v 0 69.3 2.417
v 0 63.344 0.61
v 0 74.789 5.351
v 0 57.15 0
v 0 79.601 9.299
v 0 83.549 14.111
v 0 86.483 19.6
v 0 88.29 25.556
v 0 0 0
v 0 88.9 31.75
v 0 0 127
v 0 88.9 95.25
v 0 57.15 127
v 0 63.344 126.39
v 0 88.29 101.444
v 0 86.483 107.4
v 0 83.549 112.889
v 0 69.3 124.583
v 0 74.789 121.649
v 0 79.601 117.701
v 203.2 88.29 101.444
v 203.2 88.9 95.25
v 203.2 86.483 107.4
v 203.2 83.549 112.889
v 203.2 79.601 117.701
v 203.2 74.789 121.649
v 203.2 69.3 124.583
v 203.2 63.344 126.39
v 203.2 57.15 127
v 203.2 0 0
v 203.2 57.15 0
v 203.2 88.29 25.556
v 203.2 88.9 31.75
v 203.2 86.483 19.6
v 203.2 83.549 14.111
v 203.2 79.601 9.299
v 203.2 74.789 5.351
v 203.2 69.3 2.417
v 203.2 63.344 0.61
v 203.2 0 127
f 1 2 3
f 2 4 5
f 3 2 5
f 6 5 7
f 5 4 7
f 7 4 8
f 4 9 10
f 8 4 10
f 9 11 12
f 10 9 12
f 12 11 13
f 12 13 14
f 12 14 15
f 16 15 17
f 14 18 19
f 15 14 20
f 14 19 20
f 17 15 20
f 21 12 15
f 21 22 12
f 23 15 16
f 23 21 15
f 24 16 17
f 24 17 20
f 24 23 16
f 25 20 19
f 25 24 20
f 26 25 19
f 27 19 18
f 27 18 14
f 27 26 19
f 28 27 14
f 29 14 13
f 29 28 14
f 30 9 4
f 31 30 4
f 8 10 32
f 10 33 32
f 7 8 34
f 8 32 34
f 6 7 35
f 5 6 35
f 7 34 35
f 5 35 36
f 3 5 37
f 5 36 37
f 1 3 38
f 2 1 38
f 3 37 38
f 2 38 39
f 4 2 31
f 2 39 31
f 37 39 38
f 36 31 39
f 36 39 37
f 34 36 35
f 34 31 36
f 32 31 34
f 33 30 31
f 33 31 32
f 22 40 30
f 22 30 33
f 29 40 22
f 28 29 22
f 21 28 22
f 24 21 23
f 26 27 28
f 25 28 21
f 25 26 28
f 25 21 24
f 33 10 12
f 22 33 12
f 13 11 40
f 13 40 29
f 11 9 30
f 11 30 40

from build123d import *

# Parameters (mm, degrees)
F0_W     = 88.9
F0_H     = 127
F1_DEPTH = 203.2
F2_R     = 31.75
F3_R     = 31.75


with BuildPart() as f1:
    # F0 (on Right) → F1 (new body)
    with BuildSketch(Plane.YZ):
        with Locations((44.45, 63.5)):
            Rectangle(F0_W, F0_H)
    extrude(amount=F1_DEPTH)

    # F2
    f2_edges = [f1.edges().sort_by_distance(p)[0] for p in [
        (101.6, 88.9, 127),
    ]]
    fillet(f2_edges, radius=F2_R)

    # F3
    f3_edges = [f1.edges().sort_by_distance(p)[0] for p in [
        (101.6, 88.9, 0),
    ]]
    fillet(f3_edges, radius=F3_R)


solid = f1.part
